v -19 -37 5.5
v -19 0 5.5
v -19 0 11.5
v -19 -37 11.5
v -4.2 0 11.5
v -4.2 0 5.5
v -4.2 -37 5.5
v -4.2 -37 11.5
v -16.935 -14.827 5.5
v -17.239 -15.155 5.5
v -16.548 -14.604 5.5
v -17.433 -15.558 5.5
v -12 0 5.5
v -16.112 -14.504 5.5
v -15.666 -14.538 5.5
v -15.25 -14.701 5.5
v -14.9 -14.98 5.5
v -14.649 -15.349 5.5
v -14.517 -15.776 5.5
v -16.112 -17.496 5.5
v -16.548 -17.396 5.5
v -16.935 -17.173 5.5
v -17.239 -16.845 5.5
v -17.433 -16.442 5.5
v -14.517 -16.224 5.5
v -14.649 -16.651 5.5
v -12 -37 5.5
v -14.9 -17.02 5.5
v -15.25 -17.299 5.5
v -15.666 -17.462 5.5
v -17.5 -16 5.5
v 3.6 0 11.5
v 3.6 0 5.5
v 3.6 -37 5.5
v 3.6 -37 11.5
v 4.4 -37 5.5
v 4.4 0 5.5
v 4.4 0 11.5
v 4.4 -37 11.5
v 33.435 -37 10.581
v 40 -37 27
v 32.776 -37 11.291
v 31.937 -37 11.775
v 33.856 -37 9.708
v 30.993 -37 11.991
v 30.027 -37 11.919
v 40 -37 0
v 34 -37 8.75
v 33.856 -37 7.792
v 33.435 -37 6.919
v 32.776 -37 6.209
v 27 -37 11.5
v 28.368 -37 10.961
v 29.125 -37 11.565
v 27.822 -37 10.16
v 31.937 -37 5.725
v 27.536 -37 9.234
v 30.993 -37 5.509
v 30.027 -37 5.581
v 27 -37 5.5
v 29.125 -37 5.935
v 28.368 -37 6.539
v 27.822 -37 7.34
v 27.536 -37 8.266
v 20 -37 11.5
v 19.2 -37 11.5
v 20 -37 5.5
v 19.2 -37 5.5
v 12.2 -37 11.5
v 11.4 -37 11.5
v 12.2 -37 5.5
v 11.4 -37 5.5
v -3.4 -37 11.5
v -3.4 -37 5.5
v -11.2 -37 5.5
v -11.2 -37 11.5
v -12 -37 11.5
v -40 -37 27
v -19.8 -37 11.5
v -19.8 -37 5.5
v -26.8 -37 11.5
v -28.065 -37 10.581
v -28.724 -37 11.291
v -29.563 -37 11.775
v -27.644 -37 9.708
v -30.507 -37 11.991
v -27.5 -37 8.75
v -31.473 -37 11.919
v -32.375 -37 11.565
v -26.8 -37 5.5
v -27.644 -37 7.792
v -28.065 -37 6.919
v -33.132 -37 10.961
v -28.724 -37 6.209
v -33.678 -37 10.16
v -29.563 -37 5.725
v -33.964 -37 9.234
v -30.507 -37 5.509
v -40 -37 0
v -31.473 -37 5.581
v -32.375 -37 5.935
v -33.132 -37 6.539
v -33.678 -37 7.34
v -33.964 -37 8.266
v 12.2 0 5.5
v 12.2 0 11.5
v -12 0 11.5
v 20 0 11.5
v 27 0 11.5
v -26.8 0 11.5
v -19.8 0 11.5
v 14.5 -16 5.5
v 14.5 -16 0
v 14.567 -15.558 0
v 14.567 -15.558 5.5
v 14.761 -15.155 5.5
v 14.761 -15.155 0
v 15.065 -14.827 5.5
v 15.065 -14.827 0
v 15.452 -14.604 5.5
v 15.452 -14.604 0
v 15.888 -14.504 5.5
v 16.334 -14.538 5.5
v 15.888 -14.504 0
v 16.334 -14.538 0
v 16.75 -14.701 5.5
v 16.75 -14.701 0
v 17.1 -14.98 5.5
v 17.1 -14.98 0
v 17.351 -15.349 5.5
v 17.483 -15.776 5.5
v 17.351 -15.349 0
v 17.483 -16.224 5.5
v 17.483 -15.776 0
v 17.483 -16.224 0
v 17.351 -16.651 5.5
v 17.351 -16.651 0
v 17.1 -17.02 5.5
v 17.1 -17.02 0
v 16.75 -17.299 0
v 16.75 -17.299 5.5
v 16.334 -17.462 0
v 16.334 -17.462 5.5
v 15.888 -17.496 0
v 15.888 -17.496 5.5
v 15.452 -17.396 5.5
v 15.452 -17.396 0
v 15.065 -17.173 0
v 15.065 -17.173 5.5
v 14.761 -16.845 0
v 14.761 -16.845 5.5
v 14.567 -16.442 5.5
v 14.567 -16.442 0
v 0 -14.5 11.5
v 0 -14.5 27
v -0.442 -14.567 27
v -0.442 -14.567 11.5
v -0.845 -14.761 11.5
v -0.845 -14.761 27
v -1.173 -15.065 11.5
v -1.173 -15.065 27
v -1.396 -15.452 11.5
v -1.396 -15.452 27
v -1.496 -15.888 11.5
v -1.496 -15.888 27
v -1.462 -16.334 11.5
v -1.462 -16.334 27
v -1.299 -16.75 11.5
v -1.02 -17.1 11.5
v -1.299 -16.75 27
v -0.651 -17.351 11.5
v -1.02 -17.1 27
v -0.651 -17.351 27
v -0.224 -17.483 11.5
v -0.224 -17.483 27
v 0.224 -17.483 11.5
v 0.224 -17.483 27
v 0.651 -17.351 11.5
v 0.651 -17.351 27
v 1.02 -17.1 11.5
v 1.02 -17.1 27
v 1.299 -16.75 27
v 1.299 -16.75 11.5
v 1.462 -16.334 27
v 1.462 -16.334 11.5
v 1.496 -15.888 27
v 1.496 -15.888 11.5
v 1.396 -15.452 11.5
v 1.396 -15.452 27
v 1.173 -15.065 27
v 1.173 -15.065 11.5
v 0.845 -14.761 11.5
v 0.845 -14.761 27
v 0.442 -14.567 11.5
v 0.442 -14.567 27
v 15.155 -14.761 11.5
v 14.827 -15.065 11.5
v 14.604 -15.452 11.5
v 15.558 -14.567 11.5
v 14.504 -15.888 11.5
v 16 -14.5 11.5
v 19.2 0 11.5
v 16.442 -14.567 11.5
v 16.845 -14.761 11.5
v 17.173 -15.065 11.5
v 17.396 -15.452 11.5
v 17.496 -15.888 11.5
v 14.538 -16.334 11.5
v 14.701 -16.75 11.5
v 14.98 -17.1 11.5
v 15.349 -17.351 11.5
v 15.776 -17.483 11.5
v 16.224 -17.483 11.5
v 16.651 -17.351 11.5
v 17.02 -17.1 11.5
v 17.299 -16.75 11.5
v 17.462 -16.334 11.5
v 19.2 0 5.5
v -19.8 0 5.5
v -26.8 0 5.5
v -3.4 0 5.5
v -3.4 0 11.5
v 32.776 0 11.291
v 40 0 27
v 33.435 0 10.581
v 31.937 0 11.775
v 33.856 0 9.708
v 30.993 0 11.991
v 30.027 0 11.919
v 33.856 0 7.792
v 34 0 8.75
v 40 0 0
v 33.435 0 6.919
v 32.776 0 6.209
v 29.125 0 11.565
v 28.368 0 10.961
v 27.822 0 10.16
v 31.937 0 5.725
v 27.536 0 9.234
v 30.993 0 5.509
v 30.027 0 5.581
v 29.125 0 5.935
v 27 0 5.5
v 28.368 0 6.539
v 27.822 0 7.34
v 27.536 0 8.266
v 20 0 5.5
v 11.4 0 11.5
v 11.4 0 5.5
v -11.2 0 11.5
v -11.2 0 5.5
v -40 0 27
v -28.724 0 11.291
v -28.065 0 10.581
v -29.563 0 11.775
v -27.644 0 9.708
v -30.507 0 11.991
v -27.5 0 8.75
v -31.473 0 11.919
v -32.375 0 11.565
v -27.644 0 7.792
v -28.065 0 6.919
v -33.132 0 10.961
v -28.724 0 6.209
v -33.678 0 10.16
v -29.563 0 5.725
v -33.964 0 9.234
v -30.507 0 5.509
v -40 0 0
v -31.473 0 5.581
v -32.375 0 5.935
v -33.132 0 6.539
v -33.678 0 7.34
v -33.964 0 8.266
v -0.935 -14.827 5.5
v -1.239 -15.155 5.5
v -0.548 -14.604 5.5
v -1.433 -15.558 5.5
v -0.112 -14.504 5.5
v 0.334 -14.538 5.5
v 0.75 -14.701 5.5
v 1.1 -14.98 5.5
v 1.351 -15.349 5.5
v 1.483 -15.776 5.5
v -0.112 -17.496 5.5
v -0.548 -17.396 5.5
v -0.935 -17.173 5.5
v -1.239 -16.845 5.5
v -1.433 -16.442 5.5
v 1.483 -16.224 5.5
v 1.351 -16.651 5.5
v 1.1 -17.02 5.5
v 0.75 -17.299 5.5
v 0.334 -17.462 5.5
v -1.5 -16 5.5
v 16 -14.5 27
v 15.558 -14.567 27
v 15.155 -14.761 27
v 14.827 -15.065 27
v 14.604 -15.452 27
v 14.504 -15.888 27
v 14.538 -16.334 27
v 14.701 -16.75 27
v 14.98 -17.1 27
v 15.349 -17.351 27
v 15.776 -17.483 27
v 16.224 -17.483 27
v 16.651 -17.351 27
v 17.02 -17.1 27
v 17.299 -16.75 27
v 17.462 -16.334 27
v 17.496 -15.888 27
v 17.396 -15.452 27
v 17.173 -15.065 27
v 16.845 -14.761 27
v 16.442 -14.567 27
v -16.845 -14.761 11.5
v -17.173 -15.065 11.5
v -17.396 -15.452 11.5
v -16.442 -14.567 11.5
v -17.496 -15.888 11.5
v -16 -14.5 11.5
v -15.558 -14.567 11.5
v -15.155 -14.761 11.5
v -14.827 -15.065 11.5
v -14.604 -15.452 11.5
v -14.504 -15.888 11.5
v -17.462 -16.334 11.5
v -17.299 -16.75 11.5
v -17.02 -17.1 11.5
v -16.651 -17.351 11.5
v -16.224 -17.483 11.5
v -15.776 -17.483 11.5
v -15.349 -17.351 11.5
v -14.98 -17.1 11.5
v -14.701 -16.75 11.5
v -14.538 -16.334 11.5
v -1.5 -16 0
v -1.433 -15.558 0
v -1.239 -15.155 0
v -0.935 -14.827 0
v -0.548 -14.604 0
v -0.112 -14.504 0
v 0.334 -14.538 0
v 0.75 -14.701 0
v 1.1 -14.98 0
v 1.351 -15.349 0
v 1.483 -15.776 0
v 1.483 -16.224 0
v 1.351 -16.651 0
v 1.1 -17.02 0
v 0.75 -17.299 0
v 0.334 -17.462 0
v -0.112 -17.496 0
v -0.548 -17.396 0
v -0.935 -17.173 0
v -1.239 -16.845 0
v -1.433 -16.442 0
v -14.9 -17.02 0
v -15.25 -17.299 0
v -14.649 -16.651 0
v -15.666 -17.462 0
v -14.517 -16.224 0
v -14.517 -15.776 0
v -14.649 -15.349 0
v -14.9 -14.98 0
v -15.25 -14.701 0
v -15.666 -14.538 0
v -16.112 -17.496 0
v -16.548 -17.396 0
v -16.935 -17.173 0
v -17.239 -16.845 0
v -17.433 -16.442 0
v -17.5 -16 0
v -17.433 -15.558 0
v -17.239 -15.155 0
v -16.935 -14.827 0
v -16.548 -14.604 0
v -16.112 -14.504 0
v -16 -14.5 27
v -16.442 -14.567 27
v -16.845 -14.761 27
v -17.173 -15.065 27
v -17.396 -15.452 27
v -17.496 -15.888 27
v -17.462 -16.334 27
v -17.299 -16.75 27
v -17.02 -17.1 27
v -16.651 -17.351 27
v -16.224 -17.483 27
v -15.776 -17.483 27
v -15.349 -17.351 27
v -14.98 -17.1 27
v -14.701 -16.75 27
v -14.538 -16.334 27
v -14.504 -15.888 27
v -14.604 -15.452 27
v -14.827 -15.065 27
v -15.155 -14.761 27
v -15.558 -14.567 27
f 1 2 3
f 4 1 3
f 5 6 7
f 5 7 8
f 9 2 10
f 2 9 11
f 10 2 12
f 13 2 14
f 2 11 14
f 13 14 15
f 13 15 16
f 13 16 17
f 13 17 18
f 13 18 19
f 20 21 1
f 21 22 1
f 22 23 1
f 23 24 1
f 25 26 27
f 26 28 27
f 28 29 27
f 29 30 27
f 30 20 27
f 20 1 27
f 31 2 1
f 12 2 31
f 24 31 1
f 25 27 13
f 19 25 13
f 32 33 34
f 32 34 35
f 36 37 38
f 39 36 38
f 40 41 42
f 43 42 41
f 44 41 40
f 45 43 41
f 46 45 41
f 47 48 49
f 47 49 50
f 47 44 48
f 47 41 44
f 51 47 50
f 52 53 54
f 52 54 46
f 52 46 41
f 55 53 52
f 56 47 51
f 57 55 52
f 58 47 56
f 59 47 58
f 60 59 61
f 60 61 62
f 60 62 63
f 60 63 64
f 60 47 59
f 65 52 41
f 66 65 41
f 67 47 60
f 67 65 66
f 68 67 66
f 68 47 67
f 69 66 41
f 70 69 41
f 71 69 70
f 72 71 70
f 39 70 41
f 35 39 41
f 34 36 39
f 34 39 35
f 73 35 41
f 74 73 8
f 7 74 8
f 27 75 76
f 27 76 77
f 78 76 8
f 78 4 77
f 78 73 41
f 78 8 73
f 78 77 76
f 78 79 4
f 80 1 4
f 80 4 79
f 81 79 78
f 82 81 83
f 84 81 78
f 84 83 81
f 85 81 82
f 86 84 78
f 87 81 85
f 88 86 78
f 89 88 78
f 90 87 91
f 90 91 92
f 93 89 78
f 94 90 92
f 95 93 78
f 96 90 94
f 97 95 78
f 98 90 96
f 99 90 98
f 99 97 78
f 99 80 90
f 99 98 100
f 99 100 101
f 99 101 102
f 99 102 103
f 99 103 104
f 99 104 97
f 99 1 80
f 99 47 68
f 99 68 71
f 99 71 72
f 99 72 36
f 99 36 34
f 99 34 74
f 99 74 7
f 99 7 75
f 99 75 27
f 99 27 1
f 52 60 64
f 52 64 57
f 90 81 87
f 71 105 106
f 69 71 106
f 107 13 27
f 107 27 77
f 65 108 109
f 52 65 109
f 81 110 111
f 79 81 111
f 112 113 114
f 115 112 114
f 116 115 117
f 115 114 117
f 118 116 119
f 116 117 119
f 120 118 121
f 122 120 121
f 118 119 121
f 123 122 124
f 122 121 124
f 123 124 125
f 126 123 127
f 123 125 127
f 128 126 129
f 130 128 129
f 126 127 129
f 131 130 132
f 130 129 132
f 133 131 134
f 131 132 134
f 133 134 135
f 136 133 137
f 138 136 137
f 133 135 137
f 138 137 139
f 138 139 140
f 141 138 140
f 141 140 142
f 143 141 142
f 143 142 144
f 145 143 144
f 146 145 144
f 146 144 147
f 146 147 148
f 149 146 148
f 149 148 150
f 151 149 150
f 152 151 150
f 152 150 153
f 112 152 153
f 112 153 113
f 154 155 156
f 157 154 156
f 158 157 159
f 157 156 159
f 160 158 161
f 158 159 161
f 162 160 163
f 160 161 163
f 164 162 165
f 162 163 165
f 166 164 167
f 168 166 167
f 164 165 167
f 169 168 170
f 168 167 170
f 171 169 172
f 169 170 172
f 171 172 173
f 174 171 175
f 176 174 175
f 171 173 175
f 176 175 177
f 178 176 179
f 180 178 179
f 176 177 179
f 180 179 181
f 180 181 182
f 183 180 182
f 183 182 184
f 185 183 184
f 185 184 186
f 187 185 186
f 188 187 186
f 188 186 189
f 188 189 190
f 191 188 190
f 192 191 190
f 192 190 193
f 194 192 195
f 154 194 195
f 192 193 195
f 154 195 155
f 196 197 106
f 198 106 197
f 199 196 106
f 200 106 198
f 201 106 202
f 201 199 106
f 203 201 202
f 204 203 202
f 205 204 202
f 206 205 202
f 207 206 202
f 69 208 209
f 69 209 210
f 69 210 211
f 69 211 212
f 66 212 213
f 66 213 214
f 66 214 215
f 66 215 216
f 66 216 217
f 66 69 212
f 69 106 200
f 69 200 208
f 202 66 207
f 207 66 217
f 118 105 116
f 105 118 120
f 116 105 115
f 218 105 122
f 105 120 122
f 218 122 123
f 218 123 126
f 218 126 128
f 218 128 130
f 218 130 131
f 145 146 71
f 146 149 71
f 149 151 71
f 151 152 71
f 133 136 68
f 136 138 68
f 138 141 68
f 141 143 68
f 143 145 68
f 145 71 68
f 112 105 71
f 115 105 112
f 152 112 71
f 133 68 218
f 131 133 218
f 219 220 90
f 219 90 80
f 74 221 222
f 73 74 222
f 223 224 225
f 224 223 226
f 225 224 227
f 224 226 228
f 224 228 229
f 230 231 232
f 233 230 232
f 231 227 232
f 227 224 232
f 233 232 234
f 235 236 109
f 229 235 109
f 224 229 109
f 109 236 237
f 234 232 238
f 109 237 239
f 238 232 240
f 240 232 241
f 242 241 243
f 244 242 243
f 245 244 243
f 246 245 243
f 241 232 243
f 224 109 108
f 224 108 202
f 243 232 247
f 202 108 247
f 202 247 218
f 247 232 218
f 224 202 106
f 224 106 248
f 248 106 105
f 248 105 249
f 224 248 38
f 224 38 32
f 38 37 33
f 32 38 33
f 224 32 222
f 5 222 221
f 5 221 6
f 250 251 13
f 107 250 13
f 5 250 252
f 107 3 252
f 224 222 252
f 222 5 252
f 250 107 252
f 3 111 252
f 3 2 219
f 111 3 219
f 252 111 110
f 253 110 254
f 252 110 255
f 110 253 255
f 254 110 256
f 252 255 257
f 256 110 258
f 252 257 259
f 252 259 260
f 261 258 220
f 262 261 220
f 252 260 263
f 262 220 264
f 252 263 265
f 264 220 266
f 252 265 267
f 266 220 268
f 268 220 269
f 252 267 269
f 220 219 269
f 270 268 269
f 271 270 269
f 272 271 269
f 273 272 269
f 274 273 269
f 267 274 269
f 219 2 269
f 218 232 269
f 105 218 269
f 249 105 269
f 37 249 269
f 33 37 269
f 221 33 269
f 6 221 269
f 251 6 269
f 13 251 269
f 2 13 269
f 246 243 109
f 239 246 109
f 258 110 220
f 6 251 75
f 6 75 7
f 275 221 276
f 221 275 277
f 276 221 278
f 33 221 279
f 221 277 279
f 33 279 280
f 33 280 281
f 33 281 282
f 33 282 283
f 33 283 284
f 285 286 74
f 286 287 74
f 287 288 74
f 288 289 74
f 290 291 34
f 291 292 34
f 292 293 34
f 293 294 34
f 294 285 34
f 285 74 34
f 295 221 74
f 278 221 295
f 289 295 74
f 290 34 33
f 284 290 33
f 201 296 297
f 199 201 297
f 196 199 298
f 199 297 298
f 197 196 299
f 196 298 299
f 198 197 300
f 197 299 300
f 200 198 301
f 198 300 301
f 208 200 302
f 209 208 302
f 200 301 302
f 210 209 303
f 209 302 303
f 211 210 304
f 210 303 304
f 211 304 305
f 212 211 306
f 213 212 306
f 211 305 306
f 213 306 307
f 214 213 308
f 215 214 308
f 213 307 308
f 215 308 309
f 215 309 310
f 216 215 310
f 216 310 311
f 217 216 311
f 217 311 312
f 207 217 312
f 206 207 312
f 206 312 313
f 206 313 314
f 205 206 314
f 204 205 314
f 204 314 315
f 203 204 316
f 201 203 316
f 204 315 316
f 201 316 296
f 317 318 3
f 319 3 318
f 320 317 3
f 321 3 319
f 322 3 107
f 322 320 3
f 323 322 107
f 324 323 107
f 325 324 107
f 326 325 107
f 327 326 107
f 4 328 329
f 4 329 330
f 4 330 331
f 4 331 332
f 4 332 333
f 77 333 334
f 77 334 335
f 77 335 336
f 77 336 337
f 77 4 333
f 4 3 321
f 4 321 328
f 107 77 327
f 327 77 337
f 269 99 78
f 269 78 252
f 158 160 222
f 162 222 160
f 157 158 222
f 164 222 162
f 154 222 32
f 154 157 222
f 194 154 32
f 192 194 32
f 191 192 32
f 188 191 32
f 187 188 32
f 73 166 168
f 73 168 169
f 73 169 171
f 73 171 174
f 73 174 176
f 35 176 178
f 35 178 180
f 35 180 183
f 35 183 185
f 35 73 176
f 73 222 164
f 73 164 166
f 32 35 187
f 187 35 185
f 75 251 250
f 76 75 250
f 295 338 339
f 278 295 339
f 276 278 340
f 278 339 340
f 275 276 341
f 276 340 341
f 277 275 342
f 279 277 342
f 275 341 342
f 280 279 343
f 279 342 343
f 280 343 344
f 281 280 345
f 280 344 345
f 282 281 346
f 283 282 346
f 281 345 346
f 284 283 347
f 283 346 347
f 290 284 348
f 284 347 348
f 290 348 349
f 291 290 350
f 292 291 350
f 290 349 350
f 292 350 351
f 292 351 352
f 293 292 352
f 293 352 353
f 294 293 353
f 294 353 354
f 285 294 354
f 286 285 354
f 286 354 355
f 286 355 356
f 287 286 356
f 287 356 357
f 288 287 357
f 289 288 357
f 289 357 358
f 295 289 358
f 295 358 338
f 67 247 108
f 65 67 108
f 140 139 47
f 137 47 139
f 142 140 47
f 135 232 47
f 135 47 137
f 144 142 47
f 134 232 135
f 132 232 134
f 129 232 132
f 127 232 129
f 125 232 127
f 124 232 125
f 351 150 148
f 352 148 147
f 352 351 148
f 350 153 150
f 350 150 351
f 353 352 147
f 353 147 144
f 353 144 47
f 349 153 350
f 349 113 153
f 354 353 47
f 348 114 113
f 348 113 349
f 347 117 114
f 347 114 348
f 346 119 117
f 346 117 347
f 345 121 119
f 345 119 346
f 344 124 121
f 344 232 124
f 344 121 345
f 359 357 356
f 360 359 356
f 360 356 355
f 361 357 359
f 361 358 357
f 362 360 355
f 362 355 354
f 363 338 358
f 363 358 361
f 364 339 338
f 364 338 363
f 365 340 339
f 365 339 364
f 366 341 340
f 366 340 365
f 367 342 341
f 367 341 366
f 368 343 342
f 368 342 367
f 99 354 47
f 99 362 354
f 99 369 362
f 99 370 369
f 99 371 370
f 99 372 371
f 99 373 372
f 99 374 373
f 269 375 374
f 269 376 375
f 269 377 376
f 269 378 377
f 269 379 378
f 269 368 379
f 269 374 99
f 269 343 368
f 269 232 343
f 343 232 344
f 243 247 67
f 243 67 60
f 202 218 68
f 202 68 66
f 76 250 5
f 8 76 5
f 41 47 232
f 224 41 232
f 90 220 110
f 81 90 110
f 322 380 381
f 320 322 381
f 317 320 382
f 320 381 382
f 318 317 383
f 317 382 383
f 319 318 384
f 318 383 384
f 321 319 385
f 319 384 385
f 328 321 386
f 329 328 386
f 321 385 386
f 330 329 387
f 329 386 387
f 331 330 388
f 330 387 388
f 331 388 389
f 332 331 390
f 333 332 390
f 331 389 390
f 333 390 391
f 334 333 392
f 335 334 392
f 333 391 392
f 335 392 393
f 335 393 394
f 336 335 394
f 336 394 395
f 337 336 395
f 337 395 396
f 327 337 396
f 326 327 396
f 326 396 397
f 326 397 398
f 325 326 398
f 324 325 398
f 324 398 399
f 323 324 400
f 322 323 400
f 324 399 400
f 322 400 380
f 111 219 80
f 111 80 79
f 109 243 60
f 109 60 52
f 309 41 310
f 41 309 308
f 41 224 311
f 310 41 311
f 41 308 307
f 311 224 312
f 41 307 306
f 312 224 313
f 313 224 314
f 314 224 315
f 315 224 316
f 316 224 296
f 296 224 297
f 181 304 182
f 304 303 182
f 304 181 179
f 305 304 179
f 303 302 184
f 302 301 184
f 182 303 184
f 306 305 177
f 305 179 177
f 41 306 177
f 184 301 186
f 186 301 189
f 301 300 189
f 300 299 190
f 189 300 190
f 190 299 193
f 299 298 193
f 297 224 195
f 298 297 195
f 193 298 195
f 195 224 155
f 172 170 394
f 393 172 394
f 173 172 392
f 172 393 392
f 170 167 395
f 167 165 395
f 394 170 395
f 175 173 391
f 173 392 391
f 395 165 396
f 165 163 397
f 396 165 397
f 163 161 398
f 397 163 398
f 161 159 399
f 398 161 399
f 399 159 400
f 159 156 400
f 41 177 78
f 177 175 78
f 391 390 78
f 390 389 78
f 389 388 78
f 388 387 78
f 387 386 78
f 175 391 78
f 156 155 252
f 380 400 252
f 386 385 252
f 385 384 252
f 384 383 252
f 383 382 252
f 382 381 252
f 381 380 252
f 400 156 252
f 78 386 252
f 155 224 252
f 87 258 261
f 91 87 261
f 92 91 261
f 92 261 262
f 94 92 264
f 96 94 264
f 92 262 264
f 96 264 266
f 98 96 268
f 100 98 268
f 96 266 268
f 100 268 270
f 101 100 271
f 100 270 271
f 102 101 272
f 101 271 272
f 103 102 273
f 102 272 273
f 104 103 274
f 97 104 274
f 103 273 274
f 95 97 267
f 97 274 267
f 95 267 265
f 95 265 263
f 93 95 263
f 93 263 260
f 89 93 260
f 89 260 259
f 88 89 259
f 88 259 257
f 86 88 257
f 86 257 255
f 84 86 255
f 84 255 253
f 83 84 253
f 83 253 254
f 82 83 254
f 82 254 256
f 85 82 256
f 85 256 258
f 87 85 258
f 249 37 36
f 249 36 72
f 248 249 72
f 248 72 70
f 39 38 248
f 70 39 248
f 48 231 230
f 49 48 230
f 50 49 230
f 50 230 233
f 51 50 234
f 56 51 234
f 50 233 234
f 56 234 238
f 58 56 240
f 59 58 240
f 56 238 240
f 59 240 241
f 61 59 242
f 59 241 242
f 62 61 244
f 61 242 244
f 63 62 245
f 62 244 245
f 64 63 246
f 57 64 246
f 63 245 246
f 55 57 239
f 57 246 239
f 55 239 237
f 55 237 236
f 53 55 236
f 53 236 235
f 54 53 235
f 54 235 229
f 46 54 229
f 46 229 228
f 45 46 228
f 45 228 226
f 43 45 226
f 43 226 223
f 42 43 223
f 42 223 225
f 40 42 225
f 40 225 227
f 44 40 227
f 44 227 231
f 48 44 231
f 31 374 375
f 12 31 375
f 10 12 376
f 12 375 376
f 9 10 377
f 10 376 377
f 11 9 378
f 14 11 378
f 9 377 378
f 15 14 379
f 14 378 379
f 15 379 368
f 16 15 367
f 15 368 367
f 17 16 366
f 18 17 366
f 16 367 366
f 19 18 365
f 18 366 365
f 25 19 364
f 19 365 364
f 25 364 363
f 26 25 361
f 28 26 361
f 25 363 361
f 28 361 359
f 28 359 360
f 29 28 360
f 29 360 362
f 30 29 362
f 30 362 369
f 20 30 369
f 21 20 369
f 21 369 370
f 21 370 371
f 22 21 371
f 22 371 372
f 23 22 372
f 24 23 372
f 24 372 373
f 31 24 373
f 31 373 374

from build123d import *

# Parameters (mm, degrees)
SKETCH_1_W                     = 80
SKETCH_1_H                     = 37
EXTRUDE_1_DEPTH                = 27
SKETCH_2_W                     = 7
SKETCH_2_H                     = 6
CUT_EXTRUDE_1_DEPTH            = 61.811183182
PATTERN_LINEAR_1_COUNT         = 7
PATTERN_LINEAR_1_PITCH         = 7.8
SKETCH_3_W                     = 1.5
SKETCH_3_H                     = 15.5
HOLE_WIZARD_3_0_3_1_AT_2_COUNT = 2
HOLE_WIZARD_3_0_3_1_AT_2_PITCH = 16
HOLE_WIZARD_3_0_3_1_AT_3_COUNT = 2
HOLE_WIZARD_3_0_3_1_AT_3_PITCH = 32
HOLE_WIZARD_6_5_6_5_1_D        = 6.5
HOLE_WIZARD_3_0_3_2_D          = 3


with BuildPart() as part:
    # Эскиз1 → Бобышка-Вытянуть1 (new body)
    with BuildSketch(Plane(origin=(0, 0, 0), x_dir=(-1, 0, 0), z_dir=(0, 0, -1))):
        with Locations((0, -18.5)):
            Rectangle(SKETCH_1_W, SKETCH_1_H)
    extrude(amount=-EXTRUDE_1_DEPTH)

    # Эскиз2 → Вырез-Вытянуть1 (cut, through all)
    with BuildSketch(Plane.XZ.offset(37)):
        with Locations((-23.3, 8.5)):
            Rectangle(SKETCH_2_W, SKETCH_2_H)
    cut_extrude_1 = extrude(amount=-CUT_EXTRUDE_1_DEPTH, mode=Mode.SUBTRACT)

    # Линейный массив1: Вырез-Вытянуть1 ×7
    with Locations(*[(i * PATTERN_LINEAR_1_PITCH, 0, 0) for i in range(1, PATTERN_LINEAR_1_COUNT)]):
        add(cut_extrude_1, mode=Mode.SUBTRACT)

    # Эскиз3 → Диаметр отверстия Ø3.0 (3)1 (revolve, cut)
    with BuildSketch(Plane(origin=(16, -16, 11.5), x_dir=(0, 1, 0), z_dir=(1, 0, 0))):
        with Locations((0.75, 7.75)):
            Rectangle(SKETCH_3_W, SKETCH_3_H)
    hole_wizard_3_0_3_1 = revolve(axis=Axis((16, -16, 5.15), (0, 0, 1)), mode=Mode.SUBTRACT)

    # Диаметр отверстия Ø3.0 (3)1 at 2: Диаметр отверстия Ø3.0 (3)1 ×2
    with Locations(*[(-i * HOLE_WIZARD_3_0_3_1_AT_2_PITCH, 0, 0) for i in range(1, HOLE_WIZARD_3_0_3_1_AT_2_COUNT)]):
        add(hole_wizard_3_0_3_1, mode=Mode.SUBTRACT)

    # Диаметр отверстия Ø3.0 (3)1 at 3: Диаметр отверстия Ø3.0 (3)1 ×2
    with Locations(*[(-i * HOLE_WIZARD_3_0_3_1_AT_3_PITCH, 0, 0) for i in range(1, HOLE_WIZARD_3_0_3_1_AT_3_COUNT)]):
        add(hole_wizard_3_0_3_1, mode=Mode.SUBTRACT)

    # Диаметр отверстия Ø6.5 (6.5)1 (through all)
    with Locations(Plane(origin=(0, -37, 0), x_dir=(-1, 0, 0), z_dir=(0, -1, 0))):
        with Locations((30.75, -8.75), (-30.75, -8.75)):
            Hole(HOLE_WIZARD_6_5_6_5_1_D / 2)

    # Диаметр отверстия Ø3.0 (3)2 (through all)
    with Locations(Plane.XY.offset(5.5)):
        with Locations((16, -16), (0, -16), (-16, -16)):
            Hole(HOLE_WIZARD_3_0_3_2_D / 2)


solid = part.part
